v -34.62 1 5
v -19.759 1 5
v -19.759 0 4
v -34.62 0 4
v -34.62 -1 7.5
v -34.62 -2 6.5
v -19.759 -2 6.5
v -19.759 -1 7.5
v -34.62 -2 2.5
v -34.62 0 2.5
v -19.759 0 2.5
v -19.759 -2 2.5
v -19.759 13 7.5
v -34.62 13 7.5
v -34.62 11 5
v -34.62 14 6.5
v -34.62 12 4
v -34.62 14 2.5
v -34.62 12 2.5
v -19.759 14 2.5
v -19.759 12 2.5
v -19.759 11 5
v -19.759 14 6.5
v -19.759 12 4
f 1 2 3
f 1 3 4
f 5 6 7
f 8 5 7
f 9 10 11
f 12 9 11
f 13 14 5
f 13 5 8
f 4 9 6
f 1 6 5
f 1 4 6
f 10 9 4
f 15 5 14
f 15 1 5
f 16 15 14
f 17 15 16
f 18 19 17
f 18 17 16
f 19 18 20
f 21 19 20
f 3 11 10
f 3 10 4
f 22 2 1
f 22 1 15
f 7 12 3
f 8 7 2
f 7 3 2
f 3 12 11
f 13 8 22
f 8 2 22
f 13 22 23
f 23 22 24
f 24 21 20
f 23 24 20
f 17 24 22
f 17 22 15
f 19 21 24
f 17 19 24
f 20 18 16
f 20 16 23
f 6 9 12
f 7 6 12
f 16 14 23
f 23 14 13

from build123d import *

# Parameters (mm, degrees)
SKETCH003_W     = 14.861519
SKETCH003_H     = 16
PAD001_DEPTH    = 5
SKETCH004_W     = 12
SKETCH004_H     = 2.5
POCKET002_DEPTH = 34.621148
CHAMFER_SIZE    = 1


with BuildPart() as part:
    # Sketch003 (on DatumPlane) → Pad001 (new body)
    with BuildSketch(Plane.XY.offset(2.5)):
        with Locations((-27.189388, 6)):
            Rectangle(SKETCH003_W, SKETCH003_H)
    extrude(amount=PAD001_DEPTH)

    # Sketch004 → Pocket002 (cut, through all)
    with BuildSketch(Plane.YZ):
        with Locations((6, 3.75)):
            Rectangle(SKETCH004_W, SKETCH004_H)
    extrude(amount=-POCKET002_DEPTH, mode=Mode.SUBTRACT)

    # Chamfer
    chamfer_edges = [part.edges().sort_by_distance(p)[0] for p in [
        (-27.189388, 12, 5),
        (-27.189388, 0, 5),
        (-27.189388, -2, 7.5),
        (-27.189388, 14, 7.5),
    ]]
    chamfer(chamfer_edges, length=CHAMFER_SIZE)


solid = part.part
